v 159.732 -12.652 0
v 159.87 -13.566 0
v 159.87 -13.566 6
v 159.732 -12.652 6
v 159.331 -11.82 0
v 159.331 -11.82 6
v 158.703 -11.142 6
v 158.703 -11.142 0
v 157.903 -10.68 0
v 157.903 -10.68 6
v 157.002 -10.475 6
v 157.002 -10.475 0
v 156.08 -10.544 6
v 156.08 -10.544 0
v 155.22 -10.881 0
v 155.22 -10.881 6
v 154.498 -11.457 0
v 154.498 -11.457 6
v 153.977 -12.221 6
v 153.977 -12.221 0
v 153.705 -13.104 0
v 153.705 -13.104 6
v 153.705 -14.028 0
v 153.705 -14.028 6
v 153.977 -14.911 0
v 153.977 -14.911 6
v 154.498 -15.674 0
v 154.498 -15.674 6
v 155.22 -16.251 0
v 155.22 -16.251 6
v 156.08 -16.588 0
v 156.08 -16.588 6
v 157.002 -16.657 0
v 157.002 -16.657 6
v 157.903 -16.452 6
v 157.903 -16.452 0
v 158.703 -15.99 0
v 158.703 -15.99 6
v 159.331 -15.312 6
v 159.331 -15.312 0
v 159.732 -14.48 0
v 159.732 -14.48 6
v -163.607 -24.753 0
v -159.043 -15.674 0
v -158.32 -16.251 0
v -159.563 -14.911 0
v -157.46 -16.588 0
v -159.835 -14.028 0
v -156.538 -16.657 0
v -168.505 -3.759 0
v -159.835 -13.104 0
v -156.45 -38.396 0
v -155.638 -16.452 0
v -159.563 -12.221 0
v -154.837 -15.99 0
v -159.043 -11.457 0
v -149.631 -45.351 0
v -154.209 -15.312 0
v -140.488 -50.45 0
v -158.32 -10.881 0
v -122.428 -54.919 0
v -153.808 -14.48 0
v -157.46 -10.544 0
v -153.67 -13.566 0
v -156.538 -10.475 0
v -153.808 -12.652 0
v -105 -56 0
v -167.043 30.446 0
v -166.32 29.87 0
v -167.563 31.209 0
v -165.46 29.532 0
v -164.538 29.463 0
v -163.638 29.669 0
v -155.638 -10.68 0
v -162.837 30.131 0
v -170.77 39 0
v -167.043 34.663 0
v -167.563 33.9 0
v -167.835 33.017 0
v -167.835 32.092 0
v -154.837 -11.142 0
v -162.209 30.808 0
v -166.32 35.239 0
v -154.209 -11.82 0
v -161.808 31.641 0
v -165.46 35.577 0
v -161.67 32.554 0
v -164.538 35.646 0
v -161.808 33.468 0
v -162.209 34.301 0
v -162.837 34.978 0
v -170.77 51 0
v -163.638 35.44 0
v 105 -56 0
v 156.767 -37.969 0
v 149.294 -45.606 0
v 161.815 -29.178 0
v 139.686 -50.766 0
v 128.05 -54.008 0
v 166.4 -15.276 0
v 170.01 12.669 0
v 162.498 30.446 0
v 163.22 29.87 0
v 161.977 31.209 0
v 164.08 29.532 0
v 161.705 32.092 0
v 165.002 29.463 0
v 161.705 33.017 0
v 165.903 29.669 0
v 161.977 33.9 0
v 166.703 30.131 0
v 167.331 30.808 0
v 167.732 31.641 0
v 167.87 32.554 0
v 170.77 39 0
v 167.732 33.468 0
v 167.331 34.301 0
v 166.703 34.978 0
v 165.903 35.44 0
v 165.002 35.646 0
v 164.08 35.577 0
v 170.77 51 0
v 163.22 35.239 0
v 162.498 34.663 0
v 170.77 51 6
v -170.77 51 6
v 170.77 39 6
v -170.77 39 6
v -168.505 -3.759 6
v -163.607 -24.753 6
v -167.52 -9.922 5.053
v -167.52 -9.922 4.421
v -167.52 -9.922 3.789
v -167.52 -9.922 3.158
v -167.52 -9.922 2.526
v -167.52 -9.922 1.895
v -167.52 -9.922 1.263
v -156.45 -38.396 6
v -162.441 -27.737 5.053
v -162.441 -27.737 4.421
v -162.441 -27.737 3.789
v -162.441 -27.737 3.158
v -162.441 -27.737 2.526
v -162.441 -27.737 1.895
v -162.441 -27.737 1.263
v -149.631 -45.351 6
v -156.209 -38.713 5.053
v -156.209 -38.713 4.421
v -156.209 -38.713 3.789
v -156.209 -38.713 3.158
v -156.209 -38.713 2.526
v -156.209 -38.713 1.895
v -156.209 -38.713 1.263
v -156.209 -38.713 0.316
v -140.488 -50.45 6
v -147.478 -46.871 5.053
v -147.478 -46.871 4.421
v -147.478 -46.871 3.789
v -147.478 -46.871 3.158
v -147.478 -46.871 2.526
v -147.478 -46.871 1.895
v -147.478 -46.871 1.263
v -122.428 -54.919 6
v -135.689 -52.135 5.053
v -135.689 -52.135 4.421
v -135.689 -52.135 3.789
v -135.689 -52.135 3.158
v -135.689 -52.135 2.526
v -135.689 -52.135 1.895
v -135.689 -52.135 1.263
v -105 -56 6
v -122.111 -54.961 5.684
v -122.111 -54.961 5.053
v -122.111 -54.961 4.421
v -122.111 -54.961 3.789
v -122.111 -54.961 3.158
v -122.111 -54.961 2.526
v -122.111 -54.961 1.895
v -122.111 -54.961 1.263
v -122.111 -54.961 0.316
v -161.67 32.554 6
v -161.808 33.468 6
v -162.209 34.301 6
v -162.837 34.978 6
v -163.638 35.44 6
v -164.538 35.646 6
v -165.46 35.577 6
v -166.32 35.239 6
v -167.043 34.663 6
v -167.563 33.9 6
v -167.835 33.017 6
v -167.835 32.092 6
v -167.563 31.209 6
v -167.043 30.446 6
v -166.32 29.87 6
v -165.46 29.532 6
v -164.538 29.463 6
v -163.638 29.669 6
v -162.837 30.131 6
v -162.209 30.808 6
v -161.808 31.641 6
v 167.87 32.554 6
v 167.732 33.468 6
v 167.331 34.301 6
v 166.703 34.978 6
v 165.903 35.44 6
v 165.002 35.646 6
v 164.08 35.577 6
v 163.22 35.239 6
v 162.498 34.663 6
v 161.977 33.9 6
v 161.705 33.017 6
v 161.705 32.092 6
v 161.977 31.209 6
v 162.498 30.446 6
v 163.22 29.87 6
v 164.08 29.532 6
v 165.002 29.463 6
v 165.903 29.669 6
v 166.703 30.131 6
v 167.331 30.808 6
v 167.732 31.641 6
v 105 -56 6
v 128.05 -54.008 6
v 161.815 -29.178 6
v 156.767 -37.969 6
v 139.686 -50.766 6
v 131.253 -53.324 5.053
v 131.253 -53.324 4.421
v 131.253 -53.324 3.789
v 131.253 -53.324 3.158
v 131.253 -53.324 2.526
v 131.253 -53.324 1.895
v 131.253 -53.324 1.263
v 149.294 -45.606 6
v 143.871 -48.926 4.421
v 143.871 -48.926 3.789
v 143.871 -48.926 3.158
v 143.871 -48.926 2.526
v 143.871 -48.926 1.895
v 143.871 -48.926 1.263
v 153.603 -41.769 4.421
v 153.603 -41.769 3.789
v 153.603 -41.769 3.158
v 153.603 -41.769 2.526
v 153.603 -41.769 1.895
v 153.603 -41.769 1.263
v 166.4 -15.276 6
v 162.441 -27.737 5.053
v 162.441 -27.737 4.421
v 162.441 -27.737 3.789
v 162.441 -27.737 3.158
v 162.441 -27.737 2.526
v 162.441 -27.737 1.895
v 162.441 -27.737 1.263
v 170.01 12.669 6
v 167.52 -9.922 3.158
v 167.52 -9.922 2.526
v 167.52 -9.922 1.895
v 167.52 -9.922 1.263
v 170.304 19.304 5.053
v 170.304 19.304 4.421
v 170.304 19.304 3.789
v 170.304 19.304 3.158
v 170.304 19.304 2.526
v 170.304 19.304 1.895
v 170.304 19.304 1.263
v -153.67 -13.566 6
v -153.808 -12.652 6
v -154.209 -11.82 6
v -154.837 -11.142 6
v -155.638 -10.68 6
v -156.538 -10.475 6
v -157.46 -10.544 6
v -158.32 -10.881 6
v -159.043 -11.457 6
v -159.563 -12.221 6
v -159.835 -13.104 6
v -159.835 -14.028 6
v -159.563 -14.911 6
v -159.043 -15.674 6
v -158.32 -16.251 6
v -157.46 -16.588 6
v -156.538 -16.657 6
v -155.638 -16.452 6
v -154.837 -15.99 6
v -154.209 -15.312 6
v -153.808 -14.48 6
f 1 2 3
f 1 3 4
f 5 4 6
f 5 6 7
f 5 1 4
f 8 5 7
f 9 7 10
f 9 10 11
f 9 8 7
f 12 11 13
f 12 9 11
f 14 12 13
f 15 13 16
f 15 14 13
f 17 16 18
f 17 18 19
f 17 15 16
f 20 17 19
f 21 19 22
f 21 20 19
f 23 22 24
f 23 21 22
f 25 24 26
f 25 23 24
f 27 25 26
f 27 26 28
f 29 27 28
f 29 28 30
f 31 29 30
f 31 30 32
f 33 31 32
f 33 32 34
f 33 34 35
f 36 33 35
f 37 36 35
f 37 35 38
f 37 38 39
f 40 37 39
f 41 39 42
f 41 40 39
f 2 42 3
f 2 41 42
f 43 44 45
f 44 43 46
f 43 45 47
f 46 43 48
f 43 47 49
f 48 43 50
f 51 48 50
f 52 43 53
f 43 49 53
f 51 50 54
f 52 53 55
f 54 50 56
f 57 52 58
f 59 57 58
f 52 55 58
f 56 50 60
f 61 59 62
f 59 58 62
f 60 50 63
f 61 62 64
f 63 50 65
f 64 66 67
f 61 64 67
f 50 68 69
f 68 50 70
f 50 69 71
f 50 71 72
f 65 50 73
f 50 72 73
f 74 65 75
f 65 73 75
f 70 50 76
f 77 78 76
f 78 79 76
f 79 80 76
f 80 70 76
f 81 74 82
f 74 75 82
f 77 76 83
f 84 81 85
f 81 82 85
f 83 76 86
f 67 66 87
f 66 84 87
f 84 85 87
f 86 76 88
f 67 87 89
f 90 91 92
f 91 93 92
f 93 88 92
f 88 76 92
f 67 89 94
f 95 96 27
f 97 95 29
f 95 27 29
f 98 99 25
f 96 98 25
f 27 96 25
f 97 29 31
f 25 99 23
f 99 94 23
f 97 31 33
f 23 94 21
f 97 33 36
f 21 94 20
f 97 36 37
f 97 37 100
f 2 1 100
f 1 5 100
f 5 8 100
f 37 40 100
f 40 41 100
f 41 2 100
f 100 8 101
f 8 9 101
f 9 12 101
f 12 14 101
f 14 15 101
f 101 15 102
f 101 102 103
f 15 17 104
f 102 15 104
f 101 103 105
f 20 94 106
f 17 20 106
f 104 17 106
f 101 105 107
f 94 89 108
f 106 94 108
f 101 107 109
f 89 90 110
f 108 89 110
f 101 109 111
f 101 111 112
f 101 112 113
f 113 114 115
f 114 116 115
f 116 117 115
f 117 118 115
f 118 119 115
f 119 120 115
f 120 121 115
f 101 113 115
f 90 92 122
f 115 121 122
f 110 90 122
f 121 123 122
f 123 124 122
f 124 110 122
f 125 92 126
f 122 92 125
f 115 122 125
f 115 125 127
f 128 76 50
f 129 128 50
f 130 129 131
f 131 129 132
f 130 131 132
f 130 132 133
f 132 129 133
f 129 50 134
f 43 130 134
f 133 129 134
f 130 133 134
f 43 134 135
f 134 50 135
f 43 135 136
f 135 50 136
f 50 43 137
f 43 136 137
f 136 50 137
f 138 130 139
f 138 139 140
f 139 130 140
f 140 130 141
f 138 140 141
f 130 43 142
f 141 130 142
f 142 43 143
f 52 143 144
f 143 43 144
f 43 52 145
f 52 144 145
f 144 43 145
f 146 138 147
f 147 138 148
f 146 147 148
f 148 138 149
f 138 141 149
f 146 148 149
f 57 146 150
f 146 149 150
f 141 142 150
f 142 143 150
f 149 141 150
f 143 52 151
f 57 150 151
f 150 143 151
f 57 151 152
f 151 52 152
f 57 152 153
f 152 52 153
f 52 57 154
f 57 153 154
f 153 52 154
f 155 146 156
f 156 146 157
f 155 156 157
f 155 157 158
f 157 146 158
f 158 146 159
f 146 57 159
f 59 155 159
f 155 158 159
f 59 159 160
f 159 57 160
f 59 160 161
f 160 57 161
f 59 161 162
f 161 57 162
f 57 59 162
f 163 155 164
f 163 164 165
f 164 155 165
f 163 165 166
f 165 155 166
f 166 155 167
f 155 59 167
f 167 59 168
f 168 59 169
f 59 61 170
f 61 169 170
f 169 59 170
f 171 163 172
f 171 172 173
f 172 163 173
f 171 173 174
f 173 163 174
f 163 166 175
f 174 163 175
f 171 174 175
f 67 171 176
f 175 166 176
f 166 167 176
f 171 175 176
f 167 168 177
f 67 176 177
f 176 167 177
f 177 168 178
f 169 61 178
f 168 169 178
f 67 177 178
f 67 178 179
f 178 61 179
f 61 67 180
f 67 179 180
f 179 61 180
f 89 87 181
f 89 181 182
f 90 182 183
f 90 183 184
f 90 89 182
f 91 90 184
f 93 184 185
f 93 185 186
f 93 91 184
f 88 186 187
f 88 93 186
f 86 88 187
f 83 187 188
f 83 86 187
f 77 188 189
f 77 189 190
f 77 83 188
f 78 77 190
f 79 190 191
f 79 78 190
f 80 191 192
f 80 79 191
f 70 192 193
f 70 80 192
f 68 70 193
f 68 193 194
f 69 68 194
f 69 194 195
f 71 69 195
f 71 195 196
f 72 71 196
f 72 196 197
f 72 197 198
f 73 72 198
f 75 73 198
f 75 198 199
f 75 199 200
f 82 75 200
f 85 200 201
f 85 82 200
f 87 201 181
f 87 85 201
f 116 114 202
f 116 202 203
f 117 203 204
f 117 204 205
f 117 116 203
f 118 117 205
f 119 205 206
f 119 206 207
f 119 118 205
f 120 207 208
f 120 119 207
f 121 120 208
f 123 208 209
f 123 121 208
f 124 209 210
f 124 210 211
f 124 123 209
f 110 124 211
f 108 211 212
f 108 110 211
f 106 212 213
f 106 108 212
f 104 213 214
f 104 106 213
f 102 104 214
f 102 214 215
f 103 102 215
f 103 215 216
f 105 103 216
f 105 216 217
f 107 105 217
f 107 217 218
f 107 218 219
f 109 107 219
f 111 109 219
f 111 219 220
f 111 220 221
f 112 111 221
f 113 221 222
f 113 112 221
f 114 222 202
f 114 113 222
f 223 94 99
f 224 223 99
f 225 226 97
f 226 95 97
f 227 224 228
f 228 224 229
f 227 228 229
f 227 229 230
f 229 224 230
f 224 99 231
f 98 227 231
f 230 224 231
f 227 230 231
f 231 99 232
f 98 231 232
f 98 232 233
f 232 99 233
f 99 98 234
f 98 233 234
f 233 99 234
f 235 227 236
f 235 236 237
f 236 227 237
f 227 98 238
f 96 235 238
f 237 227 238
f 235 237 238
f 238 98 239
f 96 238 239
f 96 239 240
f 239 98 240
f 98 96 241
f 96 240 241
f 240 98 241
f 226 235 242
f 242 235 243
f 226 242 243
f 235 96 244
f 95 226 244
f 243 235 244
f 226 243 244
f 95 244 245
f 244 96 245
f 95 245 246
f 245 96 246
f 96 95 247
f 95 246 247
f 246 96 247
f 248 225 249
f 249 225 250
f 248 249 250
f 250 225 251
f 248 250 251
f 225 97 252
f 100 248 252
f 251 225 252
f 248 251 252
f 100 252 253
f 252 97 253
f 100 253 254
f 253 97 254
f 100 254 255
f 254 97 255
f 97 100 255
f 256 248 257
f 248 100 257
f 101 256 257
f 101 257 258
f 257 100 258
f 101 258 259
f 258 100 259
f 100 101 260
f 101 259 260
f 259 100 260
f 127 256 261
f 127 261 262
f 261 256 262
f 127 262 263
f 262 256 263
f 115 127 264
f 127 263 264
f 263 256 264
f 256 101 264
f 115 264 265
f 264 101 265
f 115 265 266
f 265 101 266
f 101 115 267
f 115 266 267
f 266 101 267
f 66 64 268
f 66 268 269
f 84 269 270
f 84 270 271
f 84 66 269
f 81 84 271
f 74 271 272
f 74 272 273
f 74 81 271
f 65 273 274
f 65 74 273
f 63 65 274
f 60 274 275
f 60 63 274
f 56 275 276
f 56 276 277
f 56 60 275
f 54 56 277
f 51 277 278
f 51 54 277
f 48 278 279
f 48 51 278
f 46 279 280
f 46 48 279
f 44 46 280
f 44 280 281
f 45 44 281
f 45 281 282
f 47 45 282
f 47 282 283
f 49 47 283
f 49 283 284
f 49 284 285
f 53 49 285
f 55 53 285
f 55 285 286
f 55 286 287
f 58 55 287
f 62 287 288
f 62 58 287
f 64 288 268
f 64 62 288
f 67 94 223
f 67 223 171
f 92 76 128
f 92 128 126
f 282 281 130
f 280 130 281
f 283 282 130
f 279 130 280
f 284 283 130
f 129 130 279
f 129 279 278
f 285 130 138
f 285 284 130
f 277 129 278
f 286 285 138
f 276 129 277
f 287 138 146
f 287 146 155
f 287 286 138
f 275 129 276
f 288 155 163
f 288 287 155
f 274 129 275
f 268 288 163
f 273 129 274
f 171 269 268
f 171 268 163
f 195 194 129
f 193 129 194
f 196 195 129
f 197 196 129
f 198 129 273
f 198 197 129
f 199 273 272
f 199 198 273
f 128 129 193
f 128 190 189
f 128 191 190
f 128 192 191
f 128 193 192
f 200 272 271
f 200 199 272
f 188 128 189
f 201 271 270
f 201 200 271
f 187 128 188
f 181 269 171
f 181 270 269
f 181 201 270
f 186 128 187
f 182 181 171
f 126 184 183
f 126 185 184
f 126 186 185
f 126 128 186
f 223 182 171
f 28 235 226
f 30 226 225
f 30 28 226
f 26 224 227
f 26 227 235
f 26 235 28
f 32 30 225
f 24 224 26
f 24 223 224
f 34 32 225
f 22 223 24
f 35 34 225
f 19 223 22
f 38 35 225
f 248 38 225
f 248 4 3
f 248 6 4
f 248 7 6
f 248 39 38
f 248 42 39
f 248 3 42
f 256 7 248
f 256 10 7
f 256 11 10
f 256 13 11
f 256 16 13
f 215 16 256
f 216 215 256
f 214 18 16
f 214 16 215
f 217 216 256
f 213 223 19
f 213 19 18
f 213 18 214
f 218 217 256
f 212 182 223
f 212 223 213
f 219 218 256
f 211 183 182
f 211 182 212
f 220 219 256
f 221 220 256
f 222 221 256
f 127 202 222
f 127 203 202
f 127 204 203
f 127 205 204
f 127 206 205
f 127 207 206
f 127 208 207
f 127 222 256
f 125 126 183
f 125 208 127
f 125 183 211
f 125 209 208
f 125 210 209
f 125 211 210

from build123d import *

# Parameters (mm, degrees)
SKETCH2_R           = 3.1
BOSS_EXTRUDE2_DEPTH = 6


with BuildPart() as part:
    # Sketch2 → Boss-Extrude2 (new body)
    with BuildSketch(Plane.XY):
        with BuildLine():
            Line((100, -56), (-105, -56))
            add(Edge.make_bspline(
                [(-170.77007734, 39.000109259), (-170.755319597, 38.457683604), (-170.706798384, 36.537887441), (-170.637287988, 33.122957729), (-170.5261489, 27.184054493), (-170.34340093, 19.366986891), (-169.889474506, 9.608710222), (-169.039164203, -0.266842999), (-167.1706255, -13.234272429), (-163.891886546, -25.351425111), (-158.719183516, -35.536226847), (-153.788973421, -41.996369681), (-147.740986476, -47.090640281), (-140.115988759, -50.864892697), (-131.329474875, -53.495779888), (-123.622789186, -54.830760959), (-117.546310091, -55.488589317), (-113.112089799, -55.803916745), (-109.593584136, -55.942092458), (-106.905885897, -55.99243235), (-105.641968688, -55.999999365), (-105, -56)],
                knots=[0.050003059, 0.050003059, 0.050003059, 0.050003059, 0.0625, 0.09375, 0.125, 0.1875, 0.25, 0.3125, 0.375, 0.5, 0.5625, 0.625, 0.6875, 0.75, 0.8125, 0.875, 0.90625, 0.9375, 0.96875, 0.984375, 1, 1, 1, 1], degree=3))
            Line((-170.77007734, 39.000109259), (-170.770080313, 51))
            Line((-170.770080313, 51), (159.005500018, 51))
            Line((159.005500018, 51), (170.770080313, 51))
            Line((170.770080313, 51), (170.770074367, 39.000109259))
            add(Edge.make_bspline(
                [(105, -56), (105.641968688, -55.999999365), (106.905885897, -55.99243235), (109.593584136, -55.942092457), (113.112089799, -55.803916745), (117.546310092, -55.488589317), (123.622789186, -54.830760959), (131.329474876, -53.495779888), (140.11598876, -50.864892696), (147.740986477, -47.09064028), (153.788973422, -41.996369679), (158.719183518, -35.536226846), (163.891886547, -25.351425109), (167.170625501, -13.234272427), (169.039164203, -0.266842997), (169.889474507, 9.608710225), (170.343400931, 19.366986894), (170.5261489, 27.184054497), (170.637287988, 33.122957733), (170.706798384, 36.537887444), (170.755319597, 38.457683605), (170.770074367, 39.000109259)],
                knots=[0, 0, 0, 0, 0.015625, 0.03125, 0.0625, 0.09375, 0.125, 0.1875, 0.25, 0.3125, 0.375, 0.4375, 0.5, 0.625, 0.6875, 0.75, 0.8125, 0.875, 0.90625, 0.9375, 0.949996941, 0.949996941, 0.949996941, 0.949996941], degree=3))
            Line((105, -56), (100, -56))
        make_face()
        with Locations((164.770080313, 32.55449126)):
            Circle(SKETCH2_R, mode=Mode.SUBTRACT)
        with Locations((-156.770064318, -13.565854924)):
            Circle(SKETCH2_R, mode=Mode.SUBTRACT)
        with Locations((-164.770080313, 32.55449126)):
            Circle(SKETCH2_R, mode=Mode.SUBTRACT)
        with Locations((156.770064318, -13.565854924)):
            Circle(SKETCH2_R, mode=Mode.SUBTRACT)
    extrude(amount=BOSS_EXTRUDE2_DEPTH)


solid = part.part
